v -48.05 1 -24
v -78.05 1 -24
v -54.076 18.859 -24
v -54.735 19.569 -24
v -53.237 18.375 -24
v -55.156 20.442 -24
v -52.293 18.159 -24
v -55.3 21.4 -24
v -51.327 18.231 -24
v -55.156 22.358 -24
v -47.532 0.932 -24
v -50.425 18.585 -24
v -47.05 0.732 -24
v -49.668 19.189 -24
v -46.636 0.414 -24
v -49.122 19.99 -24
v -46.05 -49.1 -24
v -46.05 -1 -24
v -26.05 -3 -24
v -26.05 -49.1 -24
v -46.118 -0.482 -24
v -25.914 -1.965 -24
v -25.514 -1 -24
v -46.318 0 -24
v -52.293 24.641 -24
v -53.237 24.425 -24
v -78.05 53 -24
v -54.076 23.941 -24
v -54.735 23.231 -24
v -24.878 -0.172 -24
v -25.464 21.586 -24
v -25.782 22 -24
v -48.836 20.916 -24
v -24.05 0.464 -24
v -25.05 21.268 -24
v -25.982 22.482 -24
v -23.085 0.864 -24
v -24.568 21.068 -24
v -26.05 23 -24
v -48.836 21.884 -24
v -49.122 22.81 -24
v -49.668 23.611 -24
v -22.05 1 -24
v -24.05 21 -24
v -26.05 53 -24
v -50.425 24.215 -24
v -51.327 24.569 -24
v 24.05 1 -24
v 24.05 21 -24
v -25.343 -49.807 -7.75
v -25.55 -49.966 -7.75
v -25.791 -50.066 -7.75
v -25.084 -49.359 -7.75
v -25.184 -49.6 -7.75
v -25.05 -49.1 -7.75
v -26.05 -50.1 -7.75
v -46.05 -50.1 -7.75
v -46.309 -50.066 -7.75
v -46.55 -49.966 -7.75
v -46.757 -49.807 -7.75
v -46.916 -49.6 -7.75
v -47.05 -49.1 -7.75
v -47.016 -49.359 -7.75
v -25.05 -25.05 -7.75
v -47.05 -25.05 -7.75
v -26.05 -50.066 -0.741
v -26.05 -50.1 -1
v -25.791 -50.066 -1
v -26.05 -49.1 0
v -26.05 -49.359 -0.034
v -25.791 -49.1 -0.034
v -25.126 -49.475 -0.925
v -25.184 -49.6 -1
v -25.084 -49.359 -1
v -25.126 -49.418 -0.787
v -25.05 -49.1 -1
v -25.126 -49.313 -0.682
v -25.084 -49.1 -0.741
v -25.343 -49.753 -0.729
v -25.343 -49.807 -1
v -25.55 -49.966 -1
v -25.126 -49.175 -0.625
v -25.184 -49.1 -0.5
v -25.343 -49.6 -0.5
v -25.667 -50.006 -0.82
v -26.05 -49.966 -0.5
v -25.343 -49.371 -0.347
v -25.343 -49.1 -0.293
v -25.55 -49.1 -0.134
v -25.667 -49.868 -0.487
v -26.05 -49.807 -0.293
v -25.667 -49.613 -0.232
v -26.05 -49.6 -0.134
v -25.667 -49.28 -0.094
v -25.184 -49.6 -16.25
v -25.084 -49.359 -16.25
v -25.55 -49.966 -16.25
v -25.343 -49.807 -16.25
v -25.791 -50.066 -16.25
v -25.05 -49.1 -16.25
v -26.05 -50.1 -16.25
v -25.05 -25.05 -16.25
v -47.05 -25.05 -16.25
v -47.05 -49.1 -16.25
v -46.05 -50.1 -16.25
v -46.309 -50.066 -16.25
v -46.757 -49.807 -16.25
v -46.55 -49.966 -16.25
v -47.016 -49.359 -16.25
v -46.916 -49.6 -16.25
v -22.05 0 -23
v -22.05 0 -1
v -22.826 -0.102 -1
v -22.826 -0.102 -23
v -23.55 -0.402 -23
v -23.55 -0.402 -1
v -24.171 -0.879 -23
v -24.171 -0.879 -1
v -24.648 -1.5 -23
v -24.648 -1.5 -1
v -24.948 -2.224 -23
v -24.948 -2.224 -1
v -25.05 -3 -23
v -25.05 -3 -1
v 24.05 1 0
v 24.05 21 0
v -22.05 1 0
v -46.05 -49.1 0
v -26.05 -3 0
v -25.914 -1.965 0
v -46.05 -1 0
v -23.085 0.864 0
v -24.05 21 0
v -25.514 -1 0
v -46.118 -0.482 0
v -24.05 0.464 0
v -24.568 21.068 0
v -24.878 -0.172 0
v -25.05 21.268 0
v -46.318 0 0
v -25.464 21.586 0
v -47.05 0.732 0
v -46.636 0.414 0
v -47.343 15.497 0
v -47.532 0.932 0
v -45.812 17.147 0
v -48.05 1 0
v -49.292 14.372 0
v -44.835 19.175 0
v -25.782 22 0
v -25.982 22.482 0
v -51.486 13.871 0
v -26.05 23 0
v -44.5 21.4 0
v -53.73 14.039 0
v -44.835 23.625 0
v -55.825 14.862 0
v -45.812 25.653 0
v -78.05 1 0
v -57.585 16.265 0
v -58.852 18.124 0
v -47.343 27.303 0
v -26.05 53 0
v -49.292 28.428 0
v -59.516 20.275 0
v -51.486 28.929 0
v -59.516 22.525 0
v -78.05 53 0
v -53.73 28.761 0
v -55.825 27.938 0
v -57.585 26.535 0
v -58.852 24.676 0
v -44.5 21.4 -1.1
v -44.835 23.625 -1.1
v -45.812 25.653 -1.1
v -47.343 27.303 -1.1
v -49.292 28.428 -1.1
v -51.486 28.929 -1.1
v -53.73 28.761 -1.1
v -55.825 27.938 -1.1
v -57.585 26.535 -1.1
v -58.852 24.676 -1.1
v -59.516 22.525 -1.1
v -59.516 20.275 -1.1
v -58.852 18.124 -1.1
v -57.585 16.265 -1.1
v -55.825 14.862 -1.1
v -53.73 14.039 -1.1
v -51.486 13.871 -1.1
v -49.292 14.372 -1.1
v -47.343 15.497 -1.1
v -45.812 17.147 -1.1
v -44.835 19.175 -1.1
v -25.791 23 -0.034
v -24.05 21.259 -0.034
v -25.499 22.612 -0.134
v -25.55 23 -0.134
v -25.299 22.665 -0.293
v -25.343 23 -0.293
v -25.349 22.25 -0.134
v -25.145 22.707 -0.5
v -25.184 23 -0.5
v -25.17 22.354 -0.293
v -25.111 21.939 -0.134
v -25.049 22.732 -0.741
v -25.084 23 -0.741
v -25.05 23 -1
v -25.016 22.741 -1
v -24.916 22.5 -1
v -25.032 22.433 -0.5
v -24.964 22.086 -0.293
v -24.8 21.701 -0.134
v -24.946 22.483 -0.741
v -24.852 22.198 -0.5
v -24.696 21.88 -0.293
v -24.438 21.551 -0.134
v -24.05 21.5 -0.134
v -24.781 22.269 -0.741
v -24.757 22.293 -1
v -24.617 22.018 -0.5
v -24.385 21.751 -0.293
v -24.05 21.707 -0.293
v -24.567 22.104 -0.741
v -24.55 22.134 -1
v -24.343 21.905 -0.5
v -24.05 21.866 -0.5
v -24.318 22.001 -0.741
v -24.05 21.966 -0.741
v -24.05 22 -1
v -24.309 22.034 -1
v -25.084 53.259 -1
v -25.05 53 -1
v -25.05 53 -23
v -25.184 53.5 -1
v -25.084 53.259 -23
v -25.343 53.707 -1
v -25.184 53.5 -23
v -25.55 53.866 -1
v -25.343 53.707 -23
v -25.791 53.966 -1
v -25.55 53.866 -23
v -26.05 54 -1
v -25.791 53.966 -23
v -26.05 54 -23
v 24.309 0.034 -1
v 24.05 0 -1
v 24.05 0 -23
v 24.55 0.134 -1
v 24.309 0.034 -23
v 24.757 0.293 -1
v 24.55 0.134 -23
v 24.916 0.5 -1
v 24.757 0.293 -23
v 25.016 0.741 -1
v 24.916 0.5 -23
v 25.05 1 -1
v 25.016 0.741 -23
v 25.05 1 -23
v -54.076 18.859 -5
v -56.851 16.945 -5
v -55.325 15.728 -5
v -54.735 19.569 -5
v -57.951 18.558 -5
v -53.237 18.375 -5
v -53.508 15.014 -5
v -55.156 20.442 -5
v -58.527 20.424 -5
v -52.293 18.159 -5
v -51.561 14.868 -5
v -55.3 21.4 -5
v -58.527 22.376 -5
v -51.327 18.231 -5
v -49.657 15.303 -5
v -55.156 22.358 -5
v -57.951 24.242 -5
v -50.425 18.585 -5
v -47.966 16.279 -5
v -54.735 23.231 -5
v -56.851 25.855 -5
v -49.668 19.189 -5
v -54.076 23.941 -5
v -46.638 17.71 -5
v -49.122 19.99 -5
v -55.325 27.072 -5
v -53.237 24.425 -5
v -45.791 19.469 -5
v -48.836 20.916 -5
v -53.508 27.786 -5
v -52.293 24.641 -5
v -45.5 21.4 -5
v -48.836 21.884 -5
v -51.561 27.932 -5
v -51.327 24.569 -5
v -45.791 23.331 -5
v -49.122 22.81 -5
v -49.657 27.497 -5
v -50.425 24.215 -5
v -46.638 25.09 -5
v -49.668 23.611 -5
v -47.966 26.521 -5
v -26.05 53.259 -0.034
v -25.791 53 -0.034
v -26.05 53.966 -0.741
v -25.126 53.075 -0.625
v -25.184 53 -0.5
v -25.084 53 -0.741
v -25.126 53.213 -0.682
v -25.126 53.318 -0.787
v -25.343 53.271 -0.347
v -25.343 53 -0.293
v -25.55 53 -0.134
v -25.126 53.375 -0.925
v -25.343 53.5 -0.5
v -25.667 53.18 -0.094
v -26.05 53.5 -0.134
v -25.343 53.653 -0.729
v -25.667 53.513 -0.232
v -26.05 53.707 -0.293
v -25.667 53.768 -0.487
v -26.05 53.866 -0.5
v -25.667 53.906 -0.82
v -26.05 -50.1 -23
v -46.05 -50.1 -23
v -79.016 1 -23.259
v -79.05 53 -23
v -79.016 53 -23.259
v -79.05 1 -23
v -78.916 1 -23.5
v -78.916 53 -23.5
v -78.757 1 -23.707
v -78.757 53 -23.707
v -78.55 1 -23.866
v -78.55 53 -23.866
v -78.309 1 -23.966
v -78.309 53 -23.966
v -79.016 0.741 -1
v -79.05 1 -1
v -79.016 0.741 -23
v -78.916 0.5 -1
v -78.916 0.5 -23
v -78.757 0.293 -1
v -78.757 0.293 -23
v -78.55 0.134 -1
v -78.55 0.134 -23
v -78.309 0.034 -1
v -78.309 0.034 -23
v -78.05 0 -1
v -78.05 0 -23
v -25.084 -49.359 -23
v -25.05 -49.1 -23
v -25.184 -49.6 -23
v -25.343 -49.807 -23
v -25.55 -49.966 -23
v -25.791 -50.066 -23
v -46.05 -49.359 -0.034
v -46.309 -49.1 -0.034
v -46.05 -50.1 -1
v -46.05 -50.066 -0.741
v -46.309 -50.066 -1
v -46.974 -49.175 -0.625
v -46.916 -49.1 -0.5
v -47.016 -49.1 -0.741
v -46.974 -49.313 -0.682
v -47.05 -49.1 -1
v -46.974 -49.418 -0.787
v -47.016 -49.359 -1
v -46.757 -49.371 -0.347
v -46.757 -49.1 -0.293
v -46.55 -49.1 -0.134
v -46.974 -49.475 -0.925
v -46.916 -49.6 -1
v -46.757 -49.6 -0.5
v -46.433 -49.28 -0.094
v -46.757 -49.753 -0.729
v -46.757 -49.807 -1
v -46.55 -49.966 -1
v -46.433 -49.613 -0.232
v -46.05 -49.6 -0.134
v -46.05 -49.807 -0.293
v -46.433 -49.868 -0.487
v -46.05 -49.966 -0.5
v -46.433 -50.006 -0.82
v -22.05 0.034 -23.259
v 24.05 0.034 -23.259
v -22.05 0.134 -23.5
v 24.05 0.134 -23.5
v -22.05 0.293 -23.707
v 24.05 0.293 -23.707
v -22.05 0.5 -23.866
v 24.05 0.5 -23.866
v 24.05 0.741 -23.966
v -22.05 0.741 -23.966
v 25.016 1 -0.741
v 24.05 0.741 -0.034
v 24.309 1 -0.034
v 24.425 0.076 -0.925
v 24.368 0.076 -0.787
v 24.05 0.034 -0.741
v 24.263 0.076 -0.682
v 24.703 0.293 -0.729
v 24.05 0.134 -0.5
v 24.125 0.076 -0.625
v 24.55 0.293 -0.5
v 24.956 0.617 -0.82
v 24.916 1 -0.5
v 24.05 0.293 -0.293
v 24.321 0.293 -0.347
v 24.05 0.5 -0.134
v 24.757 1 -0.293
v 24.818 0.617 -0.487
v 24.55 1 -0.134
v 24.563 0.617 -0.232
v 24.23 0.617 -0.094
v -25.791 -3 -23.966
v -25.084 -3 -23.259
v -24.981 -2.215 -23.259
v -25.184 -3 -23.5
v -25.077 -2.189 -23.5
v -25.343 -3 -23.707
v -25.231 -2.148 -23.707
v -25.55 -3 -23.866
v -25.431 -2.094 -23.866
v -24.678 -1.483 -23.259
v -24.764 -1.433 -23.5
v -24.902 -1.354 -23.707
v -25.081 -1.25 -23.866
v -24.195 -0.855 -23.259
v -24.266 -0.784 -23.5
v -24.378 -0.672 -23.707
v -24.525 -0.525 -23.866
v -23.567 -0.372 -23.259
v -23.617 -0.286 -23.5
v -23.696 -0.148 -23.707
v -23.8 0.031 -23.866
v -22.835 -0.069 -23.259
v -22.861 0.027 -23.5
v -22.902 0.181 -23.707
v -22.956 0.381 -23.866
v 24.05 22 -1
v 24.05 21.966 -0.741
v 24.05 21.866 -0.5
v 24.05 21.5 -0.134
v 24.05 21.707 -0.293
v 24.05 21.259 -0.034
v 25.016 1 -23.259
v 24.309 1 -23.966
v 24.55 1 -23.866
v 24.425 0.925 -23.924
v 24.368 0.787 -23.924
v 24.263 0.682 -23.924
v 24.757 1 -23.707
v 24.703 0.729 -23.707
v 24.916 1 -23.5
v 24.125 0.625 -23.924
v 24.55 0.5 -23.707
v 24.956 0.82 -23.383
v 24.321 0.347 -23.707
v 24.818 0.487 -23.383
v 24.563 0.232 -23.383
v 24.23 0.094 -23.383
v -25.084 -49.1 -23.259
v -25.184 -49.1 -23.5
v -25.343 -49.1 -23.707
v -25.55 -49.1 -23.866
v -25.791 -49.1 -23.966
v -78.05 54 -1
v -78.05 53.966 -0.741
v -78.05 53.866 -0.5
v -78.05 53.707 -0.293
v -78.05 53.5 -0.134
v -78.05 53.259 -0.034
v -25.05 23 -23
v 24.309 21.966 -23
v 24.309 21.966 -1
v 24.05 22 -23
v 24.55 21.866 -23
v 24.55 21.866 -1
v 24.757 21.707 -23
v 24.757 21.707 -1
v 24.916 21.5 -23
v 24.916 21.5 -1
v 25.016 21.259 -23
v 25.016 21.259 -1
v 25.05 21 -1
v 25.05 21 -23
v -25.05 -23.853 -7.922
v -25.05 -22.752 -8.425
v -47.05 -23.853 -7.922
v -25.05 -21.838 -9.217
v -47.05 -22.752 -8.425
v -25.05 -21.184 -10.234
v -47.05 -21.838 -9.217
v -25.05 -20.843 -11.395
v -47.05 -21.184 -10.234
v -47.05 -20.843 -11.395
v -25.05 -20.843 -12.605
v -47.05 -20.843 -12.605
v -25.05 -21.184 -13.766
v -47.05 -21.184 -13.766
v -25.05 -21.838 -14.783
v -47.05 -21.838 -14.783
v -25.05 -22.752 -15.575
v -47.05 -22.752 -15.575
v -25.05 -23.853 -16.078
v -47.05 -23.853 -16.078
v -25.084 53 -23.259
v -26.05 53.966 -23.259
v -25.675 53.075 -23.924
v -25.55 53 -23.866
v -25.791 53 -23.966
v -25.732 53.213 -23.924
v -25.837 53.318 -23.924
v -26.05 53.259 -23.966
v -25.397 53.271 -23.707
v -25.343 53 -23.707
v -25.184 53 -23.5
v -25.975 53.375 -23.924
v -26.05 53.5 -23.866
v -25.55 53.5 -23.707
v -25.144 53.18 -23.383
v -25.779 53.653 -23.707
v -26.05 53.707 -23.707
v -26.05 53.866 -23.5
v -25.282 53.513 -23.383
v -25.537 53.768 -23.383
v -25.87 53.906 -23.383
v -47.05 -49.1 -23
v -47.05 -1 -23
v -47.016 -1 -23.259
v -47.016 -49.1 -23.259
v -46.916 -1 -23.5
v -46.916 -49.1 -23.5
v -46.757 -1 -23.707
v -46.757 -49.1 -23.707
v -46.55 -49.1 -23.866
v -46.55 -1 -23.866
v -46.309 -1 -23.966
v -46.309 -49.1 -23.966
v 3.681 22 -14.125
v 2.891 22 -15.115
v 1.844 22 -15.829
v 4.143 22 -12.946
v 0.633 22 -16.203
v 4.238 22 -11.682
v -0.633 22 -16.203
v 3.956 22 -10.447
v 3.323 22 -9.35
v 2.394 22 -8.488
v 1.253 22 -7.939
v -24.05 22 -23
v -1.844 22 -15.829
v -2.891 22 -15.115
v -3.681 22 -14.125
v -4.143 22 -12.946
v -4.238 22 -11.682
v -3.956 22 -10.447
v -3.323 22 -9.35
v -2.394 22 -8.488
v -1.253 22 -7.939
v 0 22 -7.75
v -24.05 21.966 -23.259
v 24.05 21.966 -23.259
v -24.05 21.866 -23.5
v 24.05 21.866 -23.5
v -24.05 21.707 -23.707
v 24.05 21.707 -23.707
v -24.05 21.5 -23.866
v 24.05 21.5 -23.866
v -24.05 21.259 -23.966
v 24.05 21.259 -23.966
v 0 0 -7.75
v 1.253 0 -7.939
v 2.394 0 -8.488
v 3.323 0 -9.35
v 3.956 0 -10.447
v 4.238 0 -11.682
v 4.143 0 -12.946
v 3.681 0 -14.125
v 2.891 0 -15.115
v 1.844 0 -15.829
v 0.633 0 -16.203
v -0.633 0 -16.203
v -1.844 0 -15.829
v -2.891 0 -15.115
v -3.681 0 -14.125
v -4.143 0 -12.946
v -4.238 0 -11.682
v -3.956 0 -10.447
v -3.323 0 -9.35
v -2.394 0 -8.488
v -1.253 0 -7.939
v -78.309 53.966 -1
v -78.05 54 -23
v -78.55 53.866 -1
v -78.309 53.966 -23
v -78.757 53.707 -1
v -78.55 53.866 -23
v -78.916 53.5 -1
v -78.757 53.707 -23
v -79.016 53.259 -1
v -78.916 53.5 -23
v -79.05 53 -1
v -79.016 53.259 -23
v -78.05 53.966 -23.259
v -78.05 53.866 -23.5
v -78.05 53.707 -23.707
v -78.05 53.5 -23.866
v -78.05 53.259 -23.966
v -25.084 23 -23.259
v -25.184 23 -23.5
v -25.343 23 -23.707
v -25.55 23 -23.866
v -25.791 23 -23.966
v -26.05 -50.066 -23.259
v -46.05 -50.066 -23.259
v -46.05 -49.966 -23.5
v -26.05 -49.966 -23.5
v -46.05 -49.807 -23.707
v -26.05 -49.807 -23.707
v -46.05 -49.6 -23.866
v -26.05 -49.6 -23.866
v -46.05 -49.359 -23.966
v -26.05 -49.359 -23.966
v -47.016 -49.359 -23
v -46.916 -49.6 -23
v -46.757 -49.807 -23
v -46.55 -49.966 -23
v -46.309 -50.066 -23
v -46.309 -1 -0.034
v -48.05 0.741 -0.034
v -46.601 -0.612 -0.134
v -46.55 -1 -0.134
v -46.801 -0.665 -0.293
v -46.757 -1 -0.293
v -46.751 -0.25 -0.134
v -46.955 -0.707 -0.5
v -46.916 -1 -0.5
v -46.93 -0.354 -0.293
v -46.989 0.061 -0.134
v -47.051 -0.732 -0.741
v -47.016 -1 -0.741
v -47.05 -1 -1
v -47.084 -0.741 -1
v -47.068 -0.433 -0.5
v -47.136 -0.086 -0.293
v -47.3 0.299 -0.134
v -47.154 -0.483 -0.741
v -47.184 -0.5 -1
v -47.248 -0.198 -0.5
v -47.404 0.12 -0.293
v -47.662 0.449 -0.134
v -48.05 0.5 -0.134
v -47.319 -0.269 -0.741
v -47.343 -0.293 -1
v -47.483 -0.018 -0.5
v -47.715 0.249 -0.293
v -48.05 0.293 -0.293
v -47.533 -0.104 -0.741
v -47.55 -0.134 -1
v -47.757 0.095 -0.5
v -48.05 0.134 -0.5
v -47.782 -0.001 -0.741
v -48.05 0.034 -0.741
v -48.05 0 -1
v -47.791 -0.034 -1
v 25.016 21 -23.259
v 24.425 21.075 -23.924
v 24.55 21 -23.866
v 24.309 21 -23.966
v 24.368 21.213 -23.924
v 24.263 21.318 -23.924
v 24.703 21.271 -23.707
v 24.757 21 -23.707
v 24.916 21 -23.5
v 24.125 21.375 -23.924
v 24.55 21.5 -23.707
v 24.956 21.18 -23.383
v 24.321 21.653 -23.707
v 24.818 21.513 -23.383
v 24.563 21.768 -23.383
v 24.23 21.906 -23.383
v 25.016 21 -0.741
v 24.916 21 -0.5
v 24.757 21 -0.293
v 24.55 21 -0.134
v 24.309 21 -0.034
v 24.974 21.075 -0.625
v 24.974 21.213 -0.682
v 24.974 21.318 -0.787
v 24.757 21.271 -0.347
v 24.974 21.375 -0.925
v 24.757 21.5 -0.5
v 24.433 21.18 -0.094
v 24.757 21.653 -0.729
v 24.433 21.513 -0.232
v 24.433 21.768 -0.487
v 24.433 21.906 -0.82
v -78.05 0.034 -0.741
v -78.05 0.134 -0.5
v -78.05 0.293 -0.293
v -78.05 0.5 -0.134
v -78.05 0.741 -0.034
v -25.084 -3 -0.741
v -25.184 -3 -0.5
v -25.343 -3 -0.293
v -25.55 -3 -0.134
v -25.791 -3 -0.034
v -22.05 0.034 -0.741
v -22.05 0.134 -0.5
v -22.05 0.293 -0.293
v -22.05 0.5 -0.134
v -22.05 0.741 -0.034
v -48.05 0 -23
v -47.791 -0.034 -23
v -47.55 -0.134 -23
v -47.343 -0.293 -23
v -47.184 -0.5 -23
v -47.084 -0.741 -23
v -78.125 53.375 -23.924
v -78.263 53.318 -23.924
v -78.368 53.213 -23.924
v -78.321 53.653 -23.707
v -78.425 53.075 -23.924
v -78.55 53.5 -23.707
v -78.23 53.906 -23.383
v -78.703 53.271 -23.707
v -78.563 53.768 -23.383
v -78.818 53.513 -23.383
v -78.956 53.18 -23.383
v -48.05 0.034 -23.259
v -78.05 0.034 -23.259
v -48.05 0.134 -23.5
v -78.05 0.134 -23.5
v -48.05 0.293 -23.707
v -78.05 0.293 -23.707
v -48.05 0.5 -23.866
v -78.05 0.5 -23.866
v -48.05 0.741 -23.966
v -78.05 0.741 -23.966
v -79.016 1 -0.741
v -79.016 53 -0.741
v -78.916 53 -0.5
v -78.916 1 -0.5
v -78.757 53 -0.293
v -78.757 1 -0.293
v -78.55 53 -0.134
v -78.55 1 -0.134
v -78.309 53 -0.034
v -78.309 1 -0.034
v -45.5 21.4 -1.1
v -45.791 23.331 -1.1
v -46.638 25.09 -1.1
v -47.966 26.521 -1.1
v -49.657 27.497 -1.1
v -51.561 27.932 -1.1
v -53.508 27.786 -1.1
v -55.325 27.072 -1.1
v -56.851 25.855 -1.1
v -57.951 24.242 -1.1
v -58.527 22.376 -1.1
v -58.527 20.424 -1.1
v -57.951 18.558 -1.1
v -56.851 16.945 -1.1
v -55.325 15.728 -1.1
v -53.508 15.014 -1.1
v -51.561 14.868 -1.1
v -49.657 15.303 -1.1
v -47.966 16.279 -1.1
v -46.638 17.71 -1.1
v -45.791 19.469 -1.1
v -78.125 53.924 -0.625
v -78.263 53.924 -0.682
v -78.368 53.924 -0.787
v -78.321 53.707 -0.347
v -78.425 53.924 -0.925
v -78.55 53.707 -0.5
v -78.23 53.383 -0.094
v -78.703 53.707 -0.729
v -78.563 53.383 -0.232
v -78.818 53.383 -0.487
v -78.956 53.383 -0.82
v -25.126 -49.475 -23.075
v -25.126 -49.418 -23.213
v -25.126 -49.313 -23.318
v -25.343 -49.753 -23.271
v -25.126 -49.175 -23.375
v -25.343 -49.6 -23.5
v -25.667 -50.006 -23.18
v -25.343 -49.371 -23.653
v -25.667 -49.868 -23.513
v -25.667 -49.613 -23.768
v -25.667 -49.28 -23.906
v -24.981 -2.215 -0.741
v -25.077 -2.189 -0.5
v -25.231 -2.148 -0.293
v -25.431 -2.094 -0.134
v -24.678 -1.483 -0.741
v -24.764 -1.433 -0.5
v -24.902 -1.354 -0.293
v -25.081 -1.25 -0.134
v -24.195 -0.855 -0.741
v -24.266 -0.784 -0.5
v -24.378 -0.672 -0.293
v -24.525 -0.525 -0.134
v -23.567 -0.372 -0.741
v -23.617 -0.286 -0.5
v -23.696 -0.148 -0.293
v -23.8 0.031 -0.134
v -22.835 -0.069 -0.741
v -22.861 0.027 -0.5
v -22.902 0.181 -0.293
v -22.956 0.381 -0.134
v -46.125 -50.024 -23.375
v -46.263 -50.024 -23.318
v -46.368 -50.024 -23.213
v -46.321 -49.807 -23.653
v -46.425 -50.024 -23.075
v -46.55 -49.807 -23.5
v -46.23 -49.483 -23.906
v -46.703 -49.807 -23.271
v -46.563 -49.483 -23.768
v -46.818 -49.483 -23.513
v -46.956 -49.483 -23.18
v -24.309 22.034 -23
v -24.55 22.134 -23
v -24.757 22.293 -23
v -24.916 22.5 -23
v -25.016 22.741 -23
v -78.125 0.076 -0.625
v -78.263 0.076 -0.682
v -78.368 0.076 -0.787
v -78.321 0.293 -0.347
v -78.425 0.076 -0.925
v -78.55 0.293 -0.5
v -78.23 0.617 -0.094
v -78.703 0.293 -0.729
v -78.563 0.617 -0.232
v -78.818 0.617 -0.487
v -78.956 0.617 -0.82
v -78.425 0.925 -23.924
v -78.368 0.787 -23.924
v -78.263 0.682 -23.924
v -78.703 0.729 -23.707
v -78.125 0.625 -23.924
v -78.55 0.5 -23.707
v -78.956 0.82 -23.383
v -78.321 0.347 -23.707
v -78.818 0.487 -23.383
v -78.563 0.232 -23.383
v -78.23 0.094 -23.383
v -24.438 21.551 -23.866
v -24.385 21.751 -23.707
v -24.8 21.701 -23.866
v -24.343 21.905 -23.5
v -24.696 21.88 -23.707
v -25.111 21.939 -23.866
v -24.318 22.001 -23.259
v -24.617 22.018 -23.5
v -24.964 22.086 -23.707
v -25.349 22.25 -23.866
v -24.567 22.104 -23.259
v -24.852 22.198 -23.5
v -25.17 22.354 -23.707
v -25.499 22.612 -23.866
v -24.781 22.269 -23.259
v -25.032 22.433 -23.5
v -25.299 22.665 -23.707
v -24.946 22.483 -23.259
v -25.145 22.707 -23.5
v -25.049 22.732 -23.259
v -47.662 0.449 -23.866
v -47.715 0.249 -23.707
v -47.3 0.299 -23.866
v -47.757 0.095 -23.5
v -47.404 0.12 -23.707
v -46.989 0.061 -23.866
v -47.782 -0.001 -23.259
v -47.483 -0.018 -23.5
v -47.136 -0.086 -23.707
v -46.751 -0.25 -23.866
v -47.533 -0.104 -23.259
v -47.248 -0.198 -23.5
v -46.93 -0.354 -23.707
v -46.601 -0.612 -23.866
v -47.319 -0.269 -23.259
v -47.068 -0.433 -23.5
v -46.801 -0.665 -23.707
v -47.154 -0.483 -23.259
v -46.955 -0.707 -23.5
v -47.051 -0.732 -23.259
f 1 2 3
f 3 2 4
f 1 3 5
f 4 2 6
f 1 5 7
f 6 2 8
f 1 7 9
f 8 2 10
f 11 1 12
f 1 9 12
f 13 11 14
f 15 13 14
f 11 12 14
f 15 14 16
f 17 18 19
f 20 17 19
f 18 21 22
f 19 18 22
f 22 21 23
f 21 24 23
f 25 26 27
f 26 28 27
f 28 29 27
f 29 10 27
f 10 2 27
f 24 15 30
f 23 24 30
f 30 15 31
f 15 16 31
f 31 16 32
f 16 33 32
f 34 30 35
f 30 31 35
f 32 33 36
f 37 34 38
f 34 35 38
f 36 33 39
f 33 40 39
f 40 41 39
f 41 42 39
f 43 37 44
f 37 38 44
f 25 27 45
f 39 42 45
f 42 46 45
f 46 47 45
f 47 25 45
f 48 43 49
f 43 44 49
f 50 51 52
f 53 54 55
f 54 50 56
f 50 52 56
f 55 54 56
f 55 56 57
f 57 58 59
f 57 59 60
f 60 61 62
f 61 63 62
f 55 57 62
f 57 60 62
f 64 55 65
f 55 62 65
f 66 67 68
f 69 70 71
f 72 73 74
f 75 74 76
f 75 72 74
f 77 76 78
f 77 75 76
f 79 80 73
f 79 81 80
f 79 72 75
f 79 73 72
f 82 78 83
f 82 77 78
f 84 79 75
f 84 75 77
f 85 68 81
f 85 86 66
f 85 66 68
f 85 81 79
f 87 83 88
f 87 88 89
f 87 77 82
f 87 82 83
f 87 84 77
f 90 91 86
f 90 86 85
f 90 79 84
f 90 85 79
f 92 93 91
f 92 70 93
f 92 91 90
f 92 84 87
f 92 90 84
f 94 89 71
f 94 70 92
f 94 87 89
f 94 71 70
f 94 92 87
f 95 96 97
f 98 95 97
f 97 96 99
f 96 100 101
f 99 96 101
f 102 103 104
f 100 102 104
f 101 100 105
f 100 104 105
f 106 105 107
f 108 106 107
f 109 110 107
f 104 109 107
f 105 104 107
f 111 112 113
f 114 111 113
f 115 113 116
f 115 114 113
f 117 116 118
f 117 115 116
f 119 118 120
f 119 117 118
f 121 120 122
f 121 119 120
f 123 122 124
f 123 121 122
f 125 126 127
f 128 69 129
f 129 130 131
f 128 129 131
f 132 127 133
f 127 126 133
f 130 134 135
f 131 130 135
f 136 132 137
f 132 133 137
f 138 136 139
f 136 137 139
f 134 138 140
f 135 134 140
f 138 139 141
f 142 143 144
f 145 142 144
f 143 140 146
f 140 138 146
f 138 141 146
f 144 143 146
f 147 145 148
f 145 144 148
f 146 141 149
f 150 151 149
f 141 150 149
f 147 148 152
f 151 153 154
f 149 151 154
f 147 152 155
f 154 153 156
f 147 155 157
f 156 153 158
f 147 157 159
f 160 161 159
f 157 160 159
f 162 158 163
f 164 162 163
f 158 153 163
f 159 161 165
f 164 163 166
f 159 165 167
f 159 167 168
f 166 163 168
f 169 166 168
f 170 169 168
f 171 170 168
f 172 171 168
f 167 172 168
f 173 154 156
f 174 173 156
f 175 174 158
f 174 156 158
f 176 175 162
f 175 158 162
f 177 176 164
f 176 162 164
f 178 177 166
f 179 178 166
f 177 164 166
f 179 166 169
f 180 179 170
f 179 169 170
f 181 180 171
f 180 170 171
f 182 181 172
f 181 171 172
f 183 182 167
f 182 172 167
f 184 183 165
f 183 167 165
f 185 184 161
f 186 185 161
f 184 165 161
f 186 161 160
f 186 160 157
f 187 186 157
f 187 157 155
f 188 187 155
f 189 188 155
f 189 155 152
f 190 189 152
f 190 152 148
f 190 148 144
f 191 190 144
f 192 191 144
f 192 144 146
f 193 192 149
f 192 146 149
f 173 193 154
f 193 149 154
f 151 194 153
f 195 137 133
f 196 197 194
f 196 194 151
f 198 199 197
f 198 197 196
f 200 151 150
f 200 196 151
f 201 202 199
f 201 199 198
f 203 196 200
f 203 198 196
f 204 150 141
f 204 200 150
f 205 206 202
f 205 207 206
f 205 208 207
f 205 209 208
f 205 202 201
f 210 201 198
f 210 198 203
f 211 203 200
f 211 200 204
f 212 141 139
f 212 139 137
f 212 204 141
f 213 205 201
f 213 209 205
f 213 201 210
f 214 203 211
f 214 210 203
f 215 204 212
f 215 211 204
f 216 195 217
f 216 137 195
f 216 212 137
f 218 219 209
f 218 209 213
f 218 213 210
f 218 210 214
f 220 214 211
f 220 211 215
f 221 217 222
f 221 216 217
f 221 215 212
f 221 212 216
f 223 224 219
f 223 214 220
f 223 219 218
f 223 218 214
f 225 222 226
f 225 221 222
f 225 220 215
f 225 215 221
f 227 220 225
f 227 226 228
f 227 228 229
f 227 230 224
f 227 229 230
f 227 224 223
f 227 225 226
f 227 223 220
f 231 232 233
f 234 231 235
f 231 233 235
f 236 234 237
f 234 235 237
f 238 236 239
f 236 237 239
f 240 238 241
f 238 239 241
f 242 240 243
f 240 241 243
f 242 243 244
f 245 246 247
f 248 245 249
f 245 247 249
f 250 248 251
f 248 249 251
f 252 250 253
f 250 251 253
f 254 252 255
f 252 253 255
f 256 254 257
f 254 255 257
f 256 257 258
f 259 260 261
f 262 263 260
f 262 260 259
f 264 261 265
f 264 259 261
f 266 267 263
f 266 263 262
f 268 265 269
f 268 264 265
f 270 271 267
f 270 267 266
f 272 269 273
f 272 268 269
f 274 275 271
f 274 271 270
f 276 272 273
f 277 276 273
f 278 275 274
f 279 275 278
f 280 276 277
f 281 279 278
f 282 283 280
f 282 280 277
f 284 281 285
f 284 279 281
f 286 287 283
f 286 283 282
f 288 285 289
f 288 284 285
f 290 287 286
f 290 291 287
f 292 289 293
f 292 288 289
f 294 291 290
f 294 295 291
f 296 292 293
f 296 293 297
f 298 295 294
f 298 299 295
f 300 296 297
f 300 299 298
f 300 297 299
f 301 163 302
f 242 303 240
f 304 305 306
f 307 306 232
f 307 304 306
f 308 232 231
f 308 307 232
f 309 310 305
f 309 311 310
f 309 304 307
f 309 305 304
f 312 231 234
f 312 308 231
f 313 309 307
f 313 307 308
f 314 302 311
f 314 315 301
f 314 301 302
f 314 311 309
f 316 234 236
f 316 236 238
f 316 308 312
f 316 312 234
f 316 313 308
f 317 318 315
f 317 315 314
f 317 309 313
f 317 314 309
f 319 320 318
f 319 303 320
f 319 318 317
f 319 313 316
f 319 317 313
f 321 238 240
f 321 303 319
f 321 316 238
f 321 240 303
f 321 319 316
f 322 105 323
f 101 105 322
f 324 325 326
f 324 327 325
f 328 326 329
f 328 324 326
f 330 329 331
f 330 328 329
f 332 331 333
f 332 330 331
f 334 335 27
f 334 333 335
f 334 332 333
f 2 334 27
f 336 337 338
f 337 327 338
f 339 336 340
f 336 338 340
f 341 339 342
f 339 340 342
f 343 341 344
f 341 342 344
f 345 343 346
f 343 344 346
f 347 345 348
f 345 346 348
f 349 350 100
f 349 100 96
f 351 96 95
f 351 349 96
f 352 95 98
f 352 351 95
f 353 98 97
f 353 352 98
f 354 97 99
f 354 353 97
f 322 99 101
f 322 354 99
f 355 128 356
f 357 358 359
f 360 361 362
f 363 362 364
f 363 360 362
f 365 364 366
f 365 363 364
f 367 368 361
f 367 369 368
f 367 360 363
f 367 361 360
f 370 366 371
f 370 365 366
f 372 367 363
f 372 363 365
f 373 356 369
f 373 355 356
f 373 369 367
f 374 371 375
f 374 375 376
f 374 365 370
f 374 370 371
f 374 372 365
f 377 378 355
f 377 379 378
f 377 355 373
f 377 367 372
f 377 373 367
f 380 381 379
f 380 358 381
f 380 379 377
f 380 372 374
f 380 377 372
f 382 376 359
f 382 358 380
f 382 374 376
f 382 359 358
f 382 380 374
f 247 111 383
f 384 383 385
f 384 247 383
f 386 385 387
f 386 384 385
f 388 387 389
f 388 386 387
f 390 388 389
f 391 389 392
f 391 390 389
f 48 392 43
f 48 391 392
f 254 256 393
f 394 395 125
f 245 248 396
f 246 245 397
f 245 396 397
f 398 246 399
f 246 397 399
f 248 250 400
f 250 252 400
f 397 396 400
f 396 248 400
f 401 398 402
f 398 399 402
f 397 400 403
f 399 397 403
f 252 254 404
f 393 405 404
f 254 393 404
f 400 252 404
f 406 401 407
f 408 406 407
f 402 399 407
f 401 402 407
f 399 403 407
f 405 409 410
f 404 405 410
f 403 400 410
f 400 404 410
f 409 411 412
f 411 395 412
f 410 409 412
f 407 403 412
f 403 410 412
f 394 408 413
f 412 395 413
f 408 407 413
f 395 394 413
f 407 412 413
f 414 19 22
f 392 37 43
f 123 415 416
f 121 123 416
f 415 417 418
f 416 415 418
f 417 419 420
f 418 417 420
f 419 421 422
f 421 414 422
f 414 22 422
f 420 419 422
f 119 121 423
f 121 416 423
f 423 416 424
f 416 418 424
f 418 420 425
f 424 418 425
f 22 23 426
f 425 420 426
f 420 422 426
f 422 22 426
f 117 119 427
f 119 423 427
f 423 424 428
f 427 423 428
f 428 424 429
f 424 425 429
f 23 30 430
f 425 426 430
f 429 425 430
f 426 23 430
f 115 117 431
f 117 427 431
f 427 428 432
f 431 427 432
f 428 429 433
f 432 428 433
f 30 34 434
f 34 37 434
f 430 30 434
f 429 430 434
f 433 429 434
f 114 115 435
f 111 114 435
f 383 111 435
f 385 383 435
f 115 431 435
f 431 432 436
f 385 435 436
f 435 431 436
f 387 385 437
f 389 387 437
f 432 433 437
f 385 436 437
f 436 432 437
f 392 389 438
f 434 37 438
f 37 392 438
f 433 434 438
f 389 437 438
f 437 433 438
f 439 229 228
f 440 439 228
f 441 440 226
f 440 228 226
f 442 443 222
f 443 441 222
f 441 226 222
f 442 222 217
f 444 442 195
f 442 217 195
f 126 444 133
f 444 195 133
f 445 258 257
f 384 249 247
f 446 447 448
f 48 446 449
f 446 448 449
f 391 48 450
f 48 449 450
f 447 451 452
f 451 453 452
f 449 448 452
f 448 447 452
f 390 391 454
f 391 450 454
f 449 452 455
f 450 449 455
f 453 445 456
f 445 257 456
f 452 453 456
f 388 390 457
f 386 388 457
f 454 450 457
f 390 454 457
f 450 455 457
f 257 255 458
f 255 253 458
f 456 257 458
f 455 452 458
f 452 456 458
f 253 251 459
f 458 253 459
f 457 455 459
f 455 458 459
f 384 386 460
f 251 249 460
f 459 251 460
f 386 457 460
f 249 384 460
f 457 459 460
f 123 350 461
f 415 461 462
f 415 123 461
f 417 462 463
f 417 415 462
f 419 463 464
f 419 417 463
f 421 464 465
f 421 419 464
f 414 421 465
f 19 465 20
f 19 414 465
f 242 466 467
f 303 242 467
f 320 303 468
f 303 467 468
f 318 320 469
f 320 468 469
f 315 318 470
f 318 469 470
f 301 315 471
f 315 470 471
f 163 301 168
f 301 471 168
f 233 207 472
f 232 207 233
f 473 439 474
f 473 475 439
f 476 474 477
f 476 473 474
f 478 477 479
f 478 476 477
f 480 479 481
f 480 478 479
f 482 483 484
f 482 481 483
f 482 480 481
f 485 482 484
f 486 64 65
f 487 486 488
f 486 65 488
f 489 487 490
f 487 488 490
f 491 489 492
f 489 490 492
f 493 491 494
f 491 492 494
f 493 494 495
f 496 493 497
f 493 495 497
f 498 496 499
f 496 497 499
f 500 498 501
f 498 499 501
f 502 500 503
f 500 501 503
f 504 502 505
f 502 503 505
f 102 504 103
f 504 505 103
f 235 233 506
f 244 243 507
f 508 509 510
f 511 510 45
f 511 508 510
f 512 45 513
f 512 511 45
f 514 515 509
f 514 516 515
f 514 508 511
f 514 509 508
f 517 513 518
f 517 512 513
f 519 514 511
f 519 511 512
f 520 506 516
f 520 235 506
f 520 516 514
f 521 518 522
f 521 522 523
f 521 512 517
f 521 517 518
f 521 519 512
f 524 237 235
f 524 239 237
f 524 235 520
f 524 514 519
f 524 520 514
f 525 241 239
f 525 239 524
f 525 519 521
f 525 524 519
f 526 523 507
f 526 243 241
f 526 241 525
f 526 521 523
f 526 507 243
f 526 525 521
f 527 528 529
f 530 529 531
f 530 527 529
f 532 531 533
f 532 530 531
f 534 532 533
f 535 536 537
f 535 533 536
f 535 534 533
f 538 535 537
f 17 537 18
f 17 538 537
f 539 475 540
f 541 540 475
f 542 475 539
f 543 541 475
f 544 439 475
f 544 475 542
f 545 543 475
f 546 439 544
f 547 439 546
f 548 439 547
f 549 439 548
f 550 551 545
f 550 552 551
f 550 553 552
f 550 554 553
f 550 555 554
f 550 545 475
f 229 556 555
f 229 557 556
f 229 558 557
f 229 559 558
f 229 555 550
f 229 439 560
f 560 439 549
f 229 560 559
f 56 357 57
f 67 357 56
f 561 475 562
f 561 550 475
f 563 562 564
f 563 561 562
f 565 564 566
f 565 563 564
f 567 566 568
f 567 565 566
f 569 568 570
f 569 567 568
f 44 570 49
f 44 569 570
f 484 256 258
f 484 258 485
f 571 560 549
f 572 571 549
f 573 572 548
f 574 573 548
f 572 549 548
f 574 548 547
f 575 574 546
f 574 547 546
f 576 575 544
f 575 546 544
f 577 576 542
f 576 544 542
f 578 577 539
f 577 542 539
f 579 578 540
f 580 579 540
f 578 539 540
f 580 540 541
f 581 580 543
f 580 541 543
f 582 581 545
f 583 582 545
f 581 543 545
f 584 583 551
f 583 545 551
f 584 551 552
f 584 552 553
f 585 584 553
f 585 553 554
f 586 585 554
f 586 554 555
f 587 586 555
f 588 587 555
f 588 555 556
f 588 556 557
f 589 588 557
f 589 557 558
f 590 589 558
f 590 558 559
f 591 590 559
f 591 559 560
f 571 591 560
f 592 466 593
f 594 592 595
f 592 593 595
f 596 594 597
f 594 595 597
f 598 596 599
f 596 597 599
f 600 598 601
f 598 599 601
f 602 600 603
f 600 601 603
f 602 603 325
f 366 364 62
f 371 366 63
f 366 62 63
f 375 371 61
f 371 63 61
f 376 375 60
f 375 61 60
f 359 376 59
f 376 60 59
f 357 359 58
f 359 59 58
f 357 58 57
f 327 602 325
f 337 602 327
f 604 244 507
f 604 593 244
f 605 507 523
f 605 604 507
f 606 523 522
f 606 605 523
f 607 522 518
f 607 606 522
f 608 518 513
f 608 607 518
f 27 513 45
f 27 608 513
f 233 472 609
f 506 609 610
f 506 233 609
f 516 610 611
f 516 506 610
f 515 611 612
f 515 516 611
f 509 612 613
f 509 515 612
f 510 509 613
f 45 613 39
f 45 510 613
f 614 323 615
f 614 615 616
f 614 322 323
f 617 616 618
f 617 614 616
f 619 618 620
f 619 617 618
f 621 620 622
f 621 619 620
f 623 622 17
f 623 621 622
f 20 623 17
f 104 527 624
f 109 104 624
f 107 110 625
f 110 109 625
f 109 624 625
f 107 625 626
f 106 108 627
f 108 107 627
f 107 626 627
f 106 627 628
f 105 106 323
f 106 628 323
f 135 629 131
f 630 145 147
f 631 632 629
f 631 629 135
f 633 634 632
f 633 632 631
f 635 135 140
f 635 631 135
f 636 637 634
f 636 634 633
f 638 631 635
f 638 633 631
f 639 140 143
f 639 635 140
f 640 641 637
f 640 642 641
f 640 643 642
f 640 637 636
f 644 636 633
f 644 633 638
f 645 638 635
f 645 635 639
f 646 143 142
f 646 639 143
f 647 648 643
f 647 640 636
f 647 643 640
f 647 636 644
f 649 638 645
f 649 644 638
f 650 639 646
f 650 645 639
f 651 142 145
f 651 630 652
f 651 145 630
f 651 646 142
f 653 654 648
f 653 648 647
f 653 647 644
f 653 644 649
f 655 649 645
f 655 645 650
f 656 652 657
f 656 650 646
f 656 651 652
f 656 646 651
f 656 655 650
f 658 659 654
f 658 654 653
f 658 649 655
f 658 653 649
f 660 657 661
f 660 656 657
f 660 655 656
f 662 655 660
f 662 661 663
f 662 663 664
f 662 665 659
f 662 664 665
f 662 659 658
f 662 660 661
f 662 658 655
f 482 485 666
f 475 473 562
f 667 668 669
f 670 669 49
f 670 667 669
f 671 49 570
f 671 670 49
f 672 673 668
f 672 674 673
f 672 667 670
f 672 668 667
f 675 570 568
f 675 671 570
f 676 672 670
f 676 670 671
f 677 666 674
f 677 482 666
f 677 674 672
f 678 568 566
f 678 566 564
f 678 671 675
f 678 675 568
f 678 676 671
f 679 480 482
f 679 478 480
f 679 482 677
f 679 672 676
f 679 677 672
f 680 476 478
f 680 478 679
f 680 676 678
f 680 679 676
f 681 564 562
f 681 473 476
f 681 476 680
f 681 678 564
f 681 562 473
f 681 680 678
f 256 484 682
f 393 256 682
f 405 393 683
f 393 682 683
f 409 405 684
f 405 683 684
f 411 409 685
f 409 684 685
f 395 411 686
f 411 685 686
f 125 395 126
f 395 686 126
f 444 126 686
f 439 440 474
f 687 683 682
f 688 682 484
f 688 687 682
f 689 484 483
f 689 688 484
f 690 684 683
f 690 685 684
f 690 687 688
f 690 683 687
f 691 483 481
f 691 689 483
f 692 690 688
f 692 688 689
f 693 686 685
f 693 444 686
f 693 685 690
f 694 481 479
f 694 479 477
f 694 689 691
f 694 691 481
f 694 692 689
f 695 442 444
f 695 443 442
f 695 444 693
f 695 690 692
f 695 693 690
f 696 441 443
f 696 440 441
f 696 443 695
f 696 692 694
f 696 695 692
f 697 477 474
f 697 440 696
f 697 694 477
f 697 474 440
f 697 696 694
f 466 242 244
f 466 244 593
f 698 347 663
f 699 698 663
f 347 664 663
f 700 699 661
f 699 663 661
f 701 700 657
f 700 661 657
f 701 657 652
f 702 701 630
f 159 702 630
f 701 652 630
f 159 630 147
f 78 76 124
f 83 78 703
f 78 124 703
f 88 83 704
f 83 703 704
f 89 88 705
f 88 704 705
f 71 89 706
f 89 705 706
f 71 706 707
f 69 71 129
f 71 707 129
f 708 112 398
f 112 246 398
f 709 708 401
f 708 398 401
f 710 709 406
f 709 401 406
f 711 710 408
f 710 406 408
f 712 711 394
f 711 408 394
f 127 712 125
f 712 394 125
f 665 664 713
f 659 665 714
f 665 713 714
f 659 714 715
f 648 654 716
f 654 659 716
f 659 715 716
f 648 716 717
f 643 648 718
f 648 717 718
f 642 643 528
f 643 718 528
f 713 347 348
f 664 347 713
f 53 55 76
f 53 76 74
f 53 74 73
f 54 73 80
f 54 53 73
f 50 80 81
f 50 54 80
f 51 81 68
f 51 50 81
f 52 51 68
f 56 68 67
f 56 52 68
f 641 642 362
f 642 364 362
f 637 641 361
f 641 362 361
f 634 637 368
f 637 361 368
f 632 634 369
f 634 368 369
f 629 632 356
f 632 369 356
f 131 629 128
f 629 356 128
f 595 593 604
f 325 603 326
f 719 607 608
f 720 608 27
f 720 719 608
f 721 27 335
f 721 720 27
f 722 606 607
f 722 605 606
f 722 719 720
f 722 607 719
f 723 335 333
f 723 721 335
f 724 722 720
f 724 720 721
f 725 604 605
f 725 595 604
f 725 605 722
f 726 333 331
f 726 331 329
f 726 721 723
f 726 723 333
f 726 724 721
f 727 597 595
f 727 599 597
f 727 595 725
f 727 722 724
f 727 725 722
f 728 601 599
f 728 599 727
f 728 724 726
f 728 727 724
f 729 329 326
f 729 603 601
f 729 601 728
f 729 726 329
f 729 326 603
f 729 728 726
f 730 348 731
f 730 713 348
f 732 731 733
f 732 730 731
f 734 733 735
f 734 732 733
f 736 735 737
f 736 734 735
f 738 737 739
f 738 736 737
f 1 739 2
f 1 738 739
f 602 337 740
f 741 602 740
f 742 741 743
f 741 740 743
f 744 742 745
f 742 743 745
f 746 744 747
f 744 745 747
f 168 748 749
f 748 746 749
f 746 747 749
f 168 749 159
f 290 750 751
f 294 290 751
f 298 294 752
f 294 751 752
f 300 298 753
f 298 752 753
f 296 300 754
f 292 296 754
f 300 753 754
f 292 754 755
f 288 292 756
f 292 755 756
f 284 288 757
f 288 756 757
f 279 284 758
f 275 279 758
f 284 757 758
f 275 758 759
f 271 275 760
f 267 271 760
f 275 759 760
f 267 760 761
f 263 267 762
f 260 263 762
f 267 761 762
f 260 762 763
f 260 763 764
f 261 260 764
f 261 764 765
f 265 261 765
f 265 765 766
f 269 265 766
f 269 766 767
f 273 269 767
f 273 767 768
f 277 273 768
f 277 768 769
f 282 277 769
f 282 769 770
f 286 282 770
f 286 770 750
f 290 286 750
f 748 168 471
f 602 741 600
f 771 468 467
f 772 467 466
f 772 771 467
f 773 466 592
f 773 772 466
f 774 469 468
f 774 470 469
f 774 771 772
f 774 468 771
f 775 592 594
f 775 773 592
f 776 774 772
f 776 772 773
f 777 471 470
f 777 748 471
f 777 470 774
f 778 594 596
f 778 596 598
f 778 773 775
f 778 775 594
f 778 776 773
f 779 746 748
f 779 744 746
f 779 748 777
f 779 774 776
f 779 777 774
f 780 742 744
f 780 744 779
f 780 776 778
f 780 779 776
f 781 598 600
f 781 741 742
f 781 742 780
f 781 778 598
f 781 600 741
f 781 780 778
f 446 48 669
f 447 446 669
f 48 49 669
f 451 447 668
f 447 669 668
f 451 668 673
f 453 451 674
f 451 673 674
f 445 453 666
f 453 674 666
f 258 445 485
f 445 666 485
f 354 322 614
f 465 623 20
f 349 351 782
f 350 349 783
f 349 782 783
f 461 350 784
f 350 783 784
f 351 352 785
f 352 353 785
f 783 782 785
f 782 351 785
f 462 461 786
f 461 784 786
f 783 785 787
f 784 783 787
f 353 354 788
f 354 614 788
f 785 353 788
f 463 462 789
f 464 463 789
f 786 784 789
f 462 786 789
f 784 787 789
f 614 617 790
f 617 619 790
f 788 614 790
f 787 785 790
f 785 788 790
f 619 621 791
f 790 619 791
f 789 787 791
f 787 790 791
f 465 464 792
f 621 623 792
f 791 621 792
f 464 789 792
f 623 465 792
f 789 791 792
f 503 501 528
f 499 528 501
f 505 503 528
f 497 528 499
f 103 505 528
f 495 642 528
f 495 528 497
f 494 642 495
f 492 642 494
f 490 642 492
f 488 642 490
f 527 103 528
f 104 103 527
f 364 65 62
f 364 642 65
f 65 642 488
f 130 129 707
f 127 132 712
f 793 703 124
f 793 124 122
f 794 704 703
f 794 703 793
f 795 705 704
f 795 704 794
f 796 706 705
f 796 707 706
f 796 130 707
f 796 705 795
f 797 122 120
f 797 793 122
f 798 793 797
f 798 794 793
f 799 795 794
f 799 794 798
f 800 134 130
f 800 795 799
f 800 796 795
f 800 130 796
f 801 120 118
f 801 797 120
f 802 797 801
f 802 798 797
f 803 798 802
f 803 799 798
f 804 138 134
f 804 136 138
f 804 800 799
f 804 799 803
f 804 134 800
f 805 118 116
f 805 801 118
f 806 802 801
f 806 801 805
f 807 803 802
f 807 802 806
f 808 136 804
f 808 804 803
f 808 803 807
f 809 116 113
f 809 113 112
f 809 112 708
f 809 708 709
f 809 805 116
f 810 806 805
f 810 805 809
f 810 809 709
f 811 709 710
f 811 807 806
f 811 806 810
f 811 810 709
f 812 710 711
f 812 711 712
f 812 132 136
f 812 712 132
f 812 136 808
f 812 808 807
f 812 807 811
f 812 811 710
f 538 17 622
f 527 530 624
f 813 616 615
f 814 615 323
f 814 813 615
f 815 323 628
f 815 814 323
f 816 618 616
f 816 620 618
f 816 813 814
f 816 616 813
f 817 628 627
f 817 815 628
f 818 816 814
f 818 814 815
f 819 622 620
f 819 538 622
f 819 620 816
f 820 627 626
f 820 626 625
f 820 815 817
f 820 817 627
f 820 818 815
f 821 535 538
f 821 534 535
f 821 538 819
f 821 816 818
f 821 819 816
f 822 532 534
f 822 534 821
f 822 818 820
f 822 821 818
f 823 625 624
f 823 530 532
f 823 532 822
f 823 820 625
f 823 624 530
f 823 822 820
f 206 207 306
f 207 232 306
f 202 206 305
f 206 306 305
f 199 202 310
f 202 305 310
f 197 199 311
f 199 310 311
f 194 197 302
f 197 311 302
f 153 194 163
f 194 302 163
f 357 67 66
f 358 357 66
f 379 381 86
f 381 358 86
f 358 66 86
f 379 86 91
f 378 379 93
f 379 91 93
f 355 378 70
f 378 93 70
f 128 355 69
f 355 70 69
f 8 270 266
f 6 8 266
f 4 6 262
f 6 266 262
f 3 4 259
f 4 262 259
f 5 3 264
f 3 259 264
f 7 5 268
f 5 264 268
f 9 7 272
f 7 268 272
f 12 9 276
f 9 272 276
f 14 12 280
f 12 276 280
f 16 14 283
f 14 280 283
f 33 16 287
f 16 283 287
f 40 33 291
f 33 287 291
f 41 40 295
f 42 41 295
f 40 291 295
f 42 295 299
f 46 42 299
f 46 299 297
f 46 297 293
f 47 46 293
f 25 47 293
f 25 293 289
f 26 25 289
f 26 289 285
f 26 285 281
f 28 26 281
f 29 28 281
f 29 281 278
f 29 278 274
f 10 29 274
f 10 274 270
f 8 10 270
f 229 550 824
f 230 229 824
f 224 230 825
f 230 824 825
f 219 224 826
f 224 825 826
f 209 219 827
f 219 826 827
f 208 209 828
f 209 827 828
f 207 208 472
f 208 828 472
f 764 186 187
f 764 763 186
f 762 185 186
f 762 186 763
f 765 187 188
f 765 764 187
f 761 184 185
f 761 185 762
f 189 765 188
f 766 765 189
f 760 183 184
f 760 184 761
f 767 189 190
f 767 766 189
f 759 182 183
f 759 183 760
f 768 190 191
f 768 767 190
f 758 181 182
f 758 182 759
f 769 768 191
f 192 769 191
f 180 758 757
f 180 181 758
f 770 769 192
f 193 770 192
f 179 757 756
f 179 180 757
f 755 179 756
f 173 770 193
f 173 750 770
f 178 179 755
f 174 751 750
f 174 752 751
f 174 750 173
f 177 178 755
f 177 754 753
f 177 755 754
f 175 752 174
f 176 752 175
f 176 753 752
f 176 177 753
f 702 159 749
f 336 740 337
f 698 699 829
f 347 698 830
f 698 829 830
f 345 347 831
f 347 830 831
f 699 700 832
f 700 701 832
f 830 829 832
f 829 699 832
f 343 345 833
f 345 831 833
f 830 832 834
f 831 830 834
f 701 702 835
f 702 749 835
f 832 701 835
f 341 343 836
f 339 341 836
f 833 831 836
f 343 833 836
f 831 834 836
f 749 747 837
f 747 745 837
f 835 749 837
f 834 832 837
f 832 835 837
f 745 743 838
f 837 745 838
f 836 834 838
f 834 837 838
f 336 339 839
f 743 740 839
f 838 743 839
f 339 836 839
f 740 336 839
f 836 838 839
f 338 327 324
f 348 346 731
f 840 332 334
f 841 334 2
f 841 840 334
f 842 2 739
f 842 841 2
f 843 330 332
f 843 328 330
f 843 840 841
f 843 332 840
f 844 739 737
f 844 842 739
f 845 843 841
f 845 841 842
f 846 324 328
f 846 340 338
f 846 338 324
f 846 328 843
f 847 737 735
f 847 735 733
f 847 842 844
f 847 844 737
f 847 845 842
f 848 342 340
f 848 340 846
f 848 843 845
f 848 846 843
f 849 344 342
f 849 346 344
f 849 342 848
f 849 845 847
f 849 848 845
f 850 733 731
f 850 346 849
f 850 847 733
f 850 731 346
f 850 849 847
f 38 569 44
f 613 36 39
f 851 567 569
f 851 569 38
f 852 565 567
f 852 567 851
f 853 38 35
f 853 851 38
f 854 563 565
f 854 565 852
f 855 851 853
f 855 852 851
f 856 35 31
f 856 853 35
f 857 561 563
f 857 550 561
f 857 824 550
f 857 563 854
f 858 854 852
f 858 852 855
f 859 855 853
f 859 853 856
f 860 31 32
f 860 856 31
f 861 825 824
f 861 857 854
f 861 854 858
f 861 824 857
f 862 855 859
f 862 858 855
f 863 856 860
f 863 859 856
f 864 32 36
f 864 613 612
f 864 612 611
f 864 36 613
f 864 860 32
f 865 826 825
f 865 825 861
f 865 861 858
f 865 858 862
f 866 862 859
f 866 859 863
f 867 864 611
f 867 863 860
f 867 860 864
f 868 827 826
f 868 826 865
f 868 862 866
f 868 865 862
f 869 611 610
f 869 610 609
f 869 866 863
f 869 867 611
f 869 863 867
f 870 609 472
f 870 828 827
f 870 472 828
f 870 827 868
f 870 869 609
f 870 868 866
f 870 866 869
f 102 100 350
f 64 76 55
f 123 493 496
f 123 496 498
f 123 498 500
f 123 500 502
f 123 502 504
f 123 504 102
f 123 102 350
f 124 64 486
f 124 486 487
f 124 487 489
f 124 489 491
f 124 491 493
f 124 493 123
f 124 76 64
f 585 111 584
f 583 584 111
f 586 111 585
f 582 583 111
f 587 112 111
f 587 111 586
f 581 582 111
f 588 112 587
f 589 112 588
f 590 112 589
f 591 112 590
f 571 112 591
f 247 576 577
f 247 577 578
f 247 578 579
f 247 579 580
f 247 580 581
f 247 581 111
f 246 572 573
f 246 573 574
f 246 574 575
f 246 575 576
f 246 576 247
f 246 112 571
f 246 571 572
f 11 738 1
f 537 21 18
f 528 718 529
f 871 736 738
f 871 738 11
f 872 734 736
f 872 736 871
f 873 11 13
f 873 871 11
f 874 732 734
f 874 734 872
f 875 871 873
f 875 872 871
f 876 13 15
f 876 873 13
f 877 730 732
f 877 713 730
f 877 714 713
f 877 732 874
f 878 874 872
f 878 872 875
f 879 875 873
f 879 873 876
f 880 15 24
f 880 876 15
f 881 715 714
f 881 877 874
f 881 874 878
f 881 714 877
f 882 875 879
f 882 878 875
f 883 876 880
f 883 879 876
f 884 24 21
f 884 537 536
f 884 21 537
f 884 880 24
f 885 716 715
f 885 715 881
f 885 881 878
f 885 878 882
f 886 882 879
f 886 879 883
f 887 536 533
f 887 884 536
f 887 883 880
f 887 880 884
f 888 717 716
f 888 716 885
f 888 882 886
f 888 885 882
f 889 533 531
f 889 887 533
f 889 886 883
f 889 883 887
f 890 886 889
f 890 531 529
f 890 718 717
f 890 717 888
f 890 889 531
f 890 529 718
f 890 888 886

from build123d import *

# Parameters (mm, degrees)
BOSS_EXTRU_1_DEPTH       = 24
CONG_1_R                 = 3
ESQUISSE2_R              = 4.25
ENL_V_MAT_EXTRU_1_DEPTH  = 110.65086639
ESQUISSE3_R              = 4.25
ENL_V_MAT_EXTRU_2_DEPTH  = 94.22236856
ESQUISSE4_R              = 3.25
ENL_V_MAT_EXTRU_3_DEPTH  = 1.5
ESQUISSE4_2_R            = 3.25
ENL_V_MAT_EXTRU_4_DEPTH  = 99.696010558
CONG_2_R                 = 1
ESQUISSE7_R              = 3.25
BOSS_EXTRU_2_DEPTH       = 3
ESQUISSE8_R              = 7.55
ENL_V_MAT_EXTRU_7_DEPTH  = 1.1
ESQUISSE9_R              = 6.55
ENL_V_MAT_EXTRU_8_DEPTH  = 5
ENL_V_MAT_EXTRU_13_DEPTH = 94.22236856


with BuildPart() as part:
    # Esquisse1 → Boss.-Extru.1 (new body)
    with BuildSketch(Plane.XY):
        Polygon((-25.05, -50.1), (-25.05, 0), (25.05, 0), (25.05, 22), (-25.05, 22), (-25.05, 54), (-79.05, 54), (-79.05, 0), (-47.05, 0), (-47.05, -50.1), align=None)
    extrude(amount=-BOSS_EXTRU_1_DEPTH)

    # Congé1
    cong_1_edges = [part.edges().sort_by_distance(p)[0] for p in [
        (-25.05, 0, -12),
    ]]
    fillet(cong_1_edges, radius=CONG_1_R)

    # Esquisse2 → Enlèv. mat.-Extru.1 (cut, through all)
    with BuildSketch(Plane(origin=(0, 22, 0), x_dir=(1, 0, 0), z_dir=(0, 1, 0))):
        with Locations((0, 12)):
            Circle(ESQUISSE2_R)
    extrude(amount=-ENL_V_MAT_EXTRU_1_DEPTH, mode=Mode.SUBTRACT)

    # Esquisse3 → Enlèv. mat.-Extru.2 (cut, through all)
    with BuildSketch(Plane.ZY.offset(47.05)):
        with Locations((-12, -25.05)):
            Circle(ESQUISSE3_R)
    extrude(amount=-ENL_V_MAT_EXTRU_2_DEPTH, mode=Mode.SUBTRACT)

    # Esquisse4 → Enlèv. mat.-Extru.3 (cut)
    with BuildSketch(Plane.XY):
        with BuildLine():
            Line((-67.05, 47.6), (-67.05, 21.4))
            ThreePointArc((-67.05, 21.4), (-52.05, 6.4), (-37.05, 21.4))
            Line((-37.05, 21.4), (-37.05, 47.6))
            Line((-37.05, 47.6), (-67.05, 47.6))
        make_face()
        with Locations((-52.05, 21.4)):
            Circle(ESQUISSE4_R, mode=Mode.SUBTRACT)
    extrude(amount=-ENL_V_MAT_EXTRU_3_DEPTH, mode=Mode.SUBTRACT)

    # Esquisse4<2> → Enlèv. mat.-Extru.4 (cut, through all)
    with BuildSketch(Plane.XY):
        with Locations((-52.05, 21.4)):
            Circle(ESQUISSE4_2_R)
    extrude(amount=-ENL_V_MAT_EXTRU_4_DEPTH, mode=Mode.SUBTRACT)

    # Congé2
    cong_2_edges = [part.edges().sort_by_distance(p)[0] for p in [
        (-63.05, 0, -24),
        (-63.05, 0, 0),
        (0, 22, -24),
        (0, 22, 0),
        (-25.05, -26.55, 0),
        (-24.171320344, -0.878679656, 0),
        (-25.05, -26.55, -24),
        (-24.171320344, -0.878679656, -24),
        (-25.05, -50.1, -12),
        (-36.05, -50.1, -24),
        (-36.05, -50.1, 0),
        (-47.05, -50.1, -12),
        (-47.05, -25.05, -24),
        (-47.05, 0, -12),
        (-47.05, -25.05, 0),
        (25.05, 22, -12),
        (25.05, 11, -24),
        (25.05, 0, -12),
        (25.05, 11, 0),
        (-25.05, 38, -24),
        (-25.05, 22, -12),
        (-25.05, 38, 0),
        (-79.05, 0, -12),
        (-79.05, 27, -24),
        (-79.05, 27, 0),
        (-79.05, 54, -12),
        (-52.05, 54, -24),
        (-25.05, 54, -12),
        (-52.05, 54, 0),
        (1.5, 0, 0),
        (1.5, 0, -24),
    ]]
    fillet(cong_2_edges, radius=CONG_2_R)

    # Esquisse7 → Boss.-Extru.2 (add)
    with BuildSketch(Plane.XY):
        with BuildLine():
            Line((-37.05, 21.4), (-37.05, 47.6))
            Line((-37.05, 47.6), (-67.05, 47.6))
            Line((-67.05, 47.6), (-67.05, 21.4))
            ThreePointArc((-67.05, 21.4), (-52.05, 6.4), (-37.05, 21.4))
        make_face()
        with Locations((-52.05, 21.4)):
            Circle(ESQUISSE7_R, mode=Mode.SUBTRACT)
    extrude(amount=-BOSS_EXTRU_2_DEPTH)

    # Esquisse8 → Enlèv. mat.-Extru.7 (cut)
    with BuildSketch(Plane.XY):
        with Locations((-52.05, 21.4)):
            Circle(ESQUISSE8_R)
    extrude(amount=-ENL_V_MAT_EXTRU_7_DEPTH, mode=Mode.SUBTRACT)

    # Esquisse9 → Enlèv. mat.-Extru.8 (cut)
    with BuildSketch(Plane.XY):
        with Locations((-52.05, 21.4)):
            Circle(ESQUISSE9_R)
    extrude(amount=-ENL_V_MAT_EXTRU_8_DEPTH, mode=Mode.SUBTRACT)

    # Esquisse14 → Enlèv. mat.-Extru.13 (cut, through all)
    with BuildSketch(Plane.ZY.offset(47.05)):
        with BuildLine():
            Line((-16.25, -25.05), (-16.25, -50.1))
            Line((-16.25, -50.1), (-7.75, -50.1))
            Line((-7.75, -50.1), (-7.75, -25.05))
            ThreePointArc((-7.75, -25.05), (-12, -20.8), (-16.25, -25.05))
        make_face()
    extrude(amount=-ENL_V_MAT_EXTRU_13_DEPTH, mode=Mode.SUBTRACT)


solid = part.part
